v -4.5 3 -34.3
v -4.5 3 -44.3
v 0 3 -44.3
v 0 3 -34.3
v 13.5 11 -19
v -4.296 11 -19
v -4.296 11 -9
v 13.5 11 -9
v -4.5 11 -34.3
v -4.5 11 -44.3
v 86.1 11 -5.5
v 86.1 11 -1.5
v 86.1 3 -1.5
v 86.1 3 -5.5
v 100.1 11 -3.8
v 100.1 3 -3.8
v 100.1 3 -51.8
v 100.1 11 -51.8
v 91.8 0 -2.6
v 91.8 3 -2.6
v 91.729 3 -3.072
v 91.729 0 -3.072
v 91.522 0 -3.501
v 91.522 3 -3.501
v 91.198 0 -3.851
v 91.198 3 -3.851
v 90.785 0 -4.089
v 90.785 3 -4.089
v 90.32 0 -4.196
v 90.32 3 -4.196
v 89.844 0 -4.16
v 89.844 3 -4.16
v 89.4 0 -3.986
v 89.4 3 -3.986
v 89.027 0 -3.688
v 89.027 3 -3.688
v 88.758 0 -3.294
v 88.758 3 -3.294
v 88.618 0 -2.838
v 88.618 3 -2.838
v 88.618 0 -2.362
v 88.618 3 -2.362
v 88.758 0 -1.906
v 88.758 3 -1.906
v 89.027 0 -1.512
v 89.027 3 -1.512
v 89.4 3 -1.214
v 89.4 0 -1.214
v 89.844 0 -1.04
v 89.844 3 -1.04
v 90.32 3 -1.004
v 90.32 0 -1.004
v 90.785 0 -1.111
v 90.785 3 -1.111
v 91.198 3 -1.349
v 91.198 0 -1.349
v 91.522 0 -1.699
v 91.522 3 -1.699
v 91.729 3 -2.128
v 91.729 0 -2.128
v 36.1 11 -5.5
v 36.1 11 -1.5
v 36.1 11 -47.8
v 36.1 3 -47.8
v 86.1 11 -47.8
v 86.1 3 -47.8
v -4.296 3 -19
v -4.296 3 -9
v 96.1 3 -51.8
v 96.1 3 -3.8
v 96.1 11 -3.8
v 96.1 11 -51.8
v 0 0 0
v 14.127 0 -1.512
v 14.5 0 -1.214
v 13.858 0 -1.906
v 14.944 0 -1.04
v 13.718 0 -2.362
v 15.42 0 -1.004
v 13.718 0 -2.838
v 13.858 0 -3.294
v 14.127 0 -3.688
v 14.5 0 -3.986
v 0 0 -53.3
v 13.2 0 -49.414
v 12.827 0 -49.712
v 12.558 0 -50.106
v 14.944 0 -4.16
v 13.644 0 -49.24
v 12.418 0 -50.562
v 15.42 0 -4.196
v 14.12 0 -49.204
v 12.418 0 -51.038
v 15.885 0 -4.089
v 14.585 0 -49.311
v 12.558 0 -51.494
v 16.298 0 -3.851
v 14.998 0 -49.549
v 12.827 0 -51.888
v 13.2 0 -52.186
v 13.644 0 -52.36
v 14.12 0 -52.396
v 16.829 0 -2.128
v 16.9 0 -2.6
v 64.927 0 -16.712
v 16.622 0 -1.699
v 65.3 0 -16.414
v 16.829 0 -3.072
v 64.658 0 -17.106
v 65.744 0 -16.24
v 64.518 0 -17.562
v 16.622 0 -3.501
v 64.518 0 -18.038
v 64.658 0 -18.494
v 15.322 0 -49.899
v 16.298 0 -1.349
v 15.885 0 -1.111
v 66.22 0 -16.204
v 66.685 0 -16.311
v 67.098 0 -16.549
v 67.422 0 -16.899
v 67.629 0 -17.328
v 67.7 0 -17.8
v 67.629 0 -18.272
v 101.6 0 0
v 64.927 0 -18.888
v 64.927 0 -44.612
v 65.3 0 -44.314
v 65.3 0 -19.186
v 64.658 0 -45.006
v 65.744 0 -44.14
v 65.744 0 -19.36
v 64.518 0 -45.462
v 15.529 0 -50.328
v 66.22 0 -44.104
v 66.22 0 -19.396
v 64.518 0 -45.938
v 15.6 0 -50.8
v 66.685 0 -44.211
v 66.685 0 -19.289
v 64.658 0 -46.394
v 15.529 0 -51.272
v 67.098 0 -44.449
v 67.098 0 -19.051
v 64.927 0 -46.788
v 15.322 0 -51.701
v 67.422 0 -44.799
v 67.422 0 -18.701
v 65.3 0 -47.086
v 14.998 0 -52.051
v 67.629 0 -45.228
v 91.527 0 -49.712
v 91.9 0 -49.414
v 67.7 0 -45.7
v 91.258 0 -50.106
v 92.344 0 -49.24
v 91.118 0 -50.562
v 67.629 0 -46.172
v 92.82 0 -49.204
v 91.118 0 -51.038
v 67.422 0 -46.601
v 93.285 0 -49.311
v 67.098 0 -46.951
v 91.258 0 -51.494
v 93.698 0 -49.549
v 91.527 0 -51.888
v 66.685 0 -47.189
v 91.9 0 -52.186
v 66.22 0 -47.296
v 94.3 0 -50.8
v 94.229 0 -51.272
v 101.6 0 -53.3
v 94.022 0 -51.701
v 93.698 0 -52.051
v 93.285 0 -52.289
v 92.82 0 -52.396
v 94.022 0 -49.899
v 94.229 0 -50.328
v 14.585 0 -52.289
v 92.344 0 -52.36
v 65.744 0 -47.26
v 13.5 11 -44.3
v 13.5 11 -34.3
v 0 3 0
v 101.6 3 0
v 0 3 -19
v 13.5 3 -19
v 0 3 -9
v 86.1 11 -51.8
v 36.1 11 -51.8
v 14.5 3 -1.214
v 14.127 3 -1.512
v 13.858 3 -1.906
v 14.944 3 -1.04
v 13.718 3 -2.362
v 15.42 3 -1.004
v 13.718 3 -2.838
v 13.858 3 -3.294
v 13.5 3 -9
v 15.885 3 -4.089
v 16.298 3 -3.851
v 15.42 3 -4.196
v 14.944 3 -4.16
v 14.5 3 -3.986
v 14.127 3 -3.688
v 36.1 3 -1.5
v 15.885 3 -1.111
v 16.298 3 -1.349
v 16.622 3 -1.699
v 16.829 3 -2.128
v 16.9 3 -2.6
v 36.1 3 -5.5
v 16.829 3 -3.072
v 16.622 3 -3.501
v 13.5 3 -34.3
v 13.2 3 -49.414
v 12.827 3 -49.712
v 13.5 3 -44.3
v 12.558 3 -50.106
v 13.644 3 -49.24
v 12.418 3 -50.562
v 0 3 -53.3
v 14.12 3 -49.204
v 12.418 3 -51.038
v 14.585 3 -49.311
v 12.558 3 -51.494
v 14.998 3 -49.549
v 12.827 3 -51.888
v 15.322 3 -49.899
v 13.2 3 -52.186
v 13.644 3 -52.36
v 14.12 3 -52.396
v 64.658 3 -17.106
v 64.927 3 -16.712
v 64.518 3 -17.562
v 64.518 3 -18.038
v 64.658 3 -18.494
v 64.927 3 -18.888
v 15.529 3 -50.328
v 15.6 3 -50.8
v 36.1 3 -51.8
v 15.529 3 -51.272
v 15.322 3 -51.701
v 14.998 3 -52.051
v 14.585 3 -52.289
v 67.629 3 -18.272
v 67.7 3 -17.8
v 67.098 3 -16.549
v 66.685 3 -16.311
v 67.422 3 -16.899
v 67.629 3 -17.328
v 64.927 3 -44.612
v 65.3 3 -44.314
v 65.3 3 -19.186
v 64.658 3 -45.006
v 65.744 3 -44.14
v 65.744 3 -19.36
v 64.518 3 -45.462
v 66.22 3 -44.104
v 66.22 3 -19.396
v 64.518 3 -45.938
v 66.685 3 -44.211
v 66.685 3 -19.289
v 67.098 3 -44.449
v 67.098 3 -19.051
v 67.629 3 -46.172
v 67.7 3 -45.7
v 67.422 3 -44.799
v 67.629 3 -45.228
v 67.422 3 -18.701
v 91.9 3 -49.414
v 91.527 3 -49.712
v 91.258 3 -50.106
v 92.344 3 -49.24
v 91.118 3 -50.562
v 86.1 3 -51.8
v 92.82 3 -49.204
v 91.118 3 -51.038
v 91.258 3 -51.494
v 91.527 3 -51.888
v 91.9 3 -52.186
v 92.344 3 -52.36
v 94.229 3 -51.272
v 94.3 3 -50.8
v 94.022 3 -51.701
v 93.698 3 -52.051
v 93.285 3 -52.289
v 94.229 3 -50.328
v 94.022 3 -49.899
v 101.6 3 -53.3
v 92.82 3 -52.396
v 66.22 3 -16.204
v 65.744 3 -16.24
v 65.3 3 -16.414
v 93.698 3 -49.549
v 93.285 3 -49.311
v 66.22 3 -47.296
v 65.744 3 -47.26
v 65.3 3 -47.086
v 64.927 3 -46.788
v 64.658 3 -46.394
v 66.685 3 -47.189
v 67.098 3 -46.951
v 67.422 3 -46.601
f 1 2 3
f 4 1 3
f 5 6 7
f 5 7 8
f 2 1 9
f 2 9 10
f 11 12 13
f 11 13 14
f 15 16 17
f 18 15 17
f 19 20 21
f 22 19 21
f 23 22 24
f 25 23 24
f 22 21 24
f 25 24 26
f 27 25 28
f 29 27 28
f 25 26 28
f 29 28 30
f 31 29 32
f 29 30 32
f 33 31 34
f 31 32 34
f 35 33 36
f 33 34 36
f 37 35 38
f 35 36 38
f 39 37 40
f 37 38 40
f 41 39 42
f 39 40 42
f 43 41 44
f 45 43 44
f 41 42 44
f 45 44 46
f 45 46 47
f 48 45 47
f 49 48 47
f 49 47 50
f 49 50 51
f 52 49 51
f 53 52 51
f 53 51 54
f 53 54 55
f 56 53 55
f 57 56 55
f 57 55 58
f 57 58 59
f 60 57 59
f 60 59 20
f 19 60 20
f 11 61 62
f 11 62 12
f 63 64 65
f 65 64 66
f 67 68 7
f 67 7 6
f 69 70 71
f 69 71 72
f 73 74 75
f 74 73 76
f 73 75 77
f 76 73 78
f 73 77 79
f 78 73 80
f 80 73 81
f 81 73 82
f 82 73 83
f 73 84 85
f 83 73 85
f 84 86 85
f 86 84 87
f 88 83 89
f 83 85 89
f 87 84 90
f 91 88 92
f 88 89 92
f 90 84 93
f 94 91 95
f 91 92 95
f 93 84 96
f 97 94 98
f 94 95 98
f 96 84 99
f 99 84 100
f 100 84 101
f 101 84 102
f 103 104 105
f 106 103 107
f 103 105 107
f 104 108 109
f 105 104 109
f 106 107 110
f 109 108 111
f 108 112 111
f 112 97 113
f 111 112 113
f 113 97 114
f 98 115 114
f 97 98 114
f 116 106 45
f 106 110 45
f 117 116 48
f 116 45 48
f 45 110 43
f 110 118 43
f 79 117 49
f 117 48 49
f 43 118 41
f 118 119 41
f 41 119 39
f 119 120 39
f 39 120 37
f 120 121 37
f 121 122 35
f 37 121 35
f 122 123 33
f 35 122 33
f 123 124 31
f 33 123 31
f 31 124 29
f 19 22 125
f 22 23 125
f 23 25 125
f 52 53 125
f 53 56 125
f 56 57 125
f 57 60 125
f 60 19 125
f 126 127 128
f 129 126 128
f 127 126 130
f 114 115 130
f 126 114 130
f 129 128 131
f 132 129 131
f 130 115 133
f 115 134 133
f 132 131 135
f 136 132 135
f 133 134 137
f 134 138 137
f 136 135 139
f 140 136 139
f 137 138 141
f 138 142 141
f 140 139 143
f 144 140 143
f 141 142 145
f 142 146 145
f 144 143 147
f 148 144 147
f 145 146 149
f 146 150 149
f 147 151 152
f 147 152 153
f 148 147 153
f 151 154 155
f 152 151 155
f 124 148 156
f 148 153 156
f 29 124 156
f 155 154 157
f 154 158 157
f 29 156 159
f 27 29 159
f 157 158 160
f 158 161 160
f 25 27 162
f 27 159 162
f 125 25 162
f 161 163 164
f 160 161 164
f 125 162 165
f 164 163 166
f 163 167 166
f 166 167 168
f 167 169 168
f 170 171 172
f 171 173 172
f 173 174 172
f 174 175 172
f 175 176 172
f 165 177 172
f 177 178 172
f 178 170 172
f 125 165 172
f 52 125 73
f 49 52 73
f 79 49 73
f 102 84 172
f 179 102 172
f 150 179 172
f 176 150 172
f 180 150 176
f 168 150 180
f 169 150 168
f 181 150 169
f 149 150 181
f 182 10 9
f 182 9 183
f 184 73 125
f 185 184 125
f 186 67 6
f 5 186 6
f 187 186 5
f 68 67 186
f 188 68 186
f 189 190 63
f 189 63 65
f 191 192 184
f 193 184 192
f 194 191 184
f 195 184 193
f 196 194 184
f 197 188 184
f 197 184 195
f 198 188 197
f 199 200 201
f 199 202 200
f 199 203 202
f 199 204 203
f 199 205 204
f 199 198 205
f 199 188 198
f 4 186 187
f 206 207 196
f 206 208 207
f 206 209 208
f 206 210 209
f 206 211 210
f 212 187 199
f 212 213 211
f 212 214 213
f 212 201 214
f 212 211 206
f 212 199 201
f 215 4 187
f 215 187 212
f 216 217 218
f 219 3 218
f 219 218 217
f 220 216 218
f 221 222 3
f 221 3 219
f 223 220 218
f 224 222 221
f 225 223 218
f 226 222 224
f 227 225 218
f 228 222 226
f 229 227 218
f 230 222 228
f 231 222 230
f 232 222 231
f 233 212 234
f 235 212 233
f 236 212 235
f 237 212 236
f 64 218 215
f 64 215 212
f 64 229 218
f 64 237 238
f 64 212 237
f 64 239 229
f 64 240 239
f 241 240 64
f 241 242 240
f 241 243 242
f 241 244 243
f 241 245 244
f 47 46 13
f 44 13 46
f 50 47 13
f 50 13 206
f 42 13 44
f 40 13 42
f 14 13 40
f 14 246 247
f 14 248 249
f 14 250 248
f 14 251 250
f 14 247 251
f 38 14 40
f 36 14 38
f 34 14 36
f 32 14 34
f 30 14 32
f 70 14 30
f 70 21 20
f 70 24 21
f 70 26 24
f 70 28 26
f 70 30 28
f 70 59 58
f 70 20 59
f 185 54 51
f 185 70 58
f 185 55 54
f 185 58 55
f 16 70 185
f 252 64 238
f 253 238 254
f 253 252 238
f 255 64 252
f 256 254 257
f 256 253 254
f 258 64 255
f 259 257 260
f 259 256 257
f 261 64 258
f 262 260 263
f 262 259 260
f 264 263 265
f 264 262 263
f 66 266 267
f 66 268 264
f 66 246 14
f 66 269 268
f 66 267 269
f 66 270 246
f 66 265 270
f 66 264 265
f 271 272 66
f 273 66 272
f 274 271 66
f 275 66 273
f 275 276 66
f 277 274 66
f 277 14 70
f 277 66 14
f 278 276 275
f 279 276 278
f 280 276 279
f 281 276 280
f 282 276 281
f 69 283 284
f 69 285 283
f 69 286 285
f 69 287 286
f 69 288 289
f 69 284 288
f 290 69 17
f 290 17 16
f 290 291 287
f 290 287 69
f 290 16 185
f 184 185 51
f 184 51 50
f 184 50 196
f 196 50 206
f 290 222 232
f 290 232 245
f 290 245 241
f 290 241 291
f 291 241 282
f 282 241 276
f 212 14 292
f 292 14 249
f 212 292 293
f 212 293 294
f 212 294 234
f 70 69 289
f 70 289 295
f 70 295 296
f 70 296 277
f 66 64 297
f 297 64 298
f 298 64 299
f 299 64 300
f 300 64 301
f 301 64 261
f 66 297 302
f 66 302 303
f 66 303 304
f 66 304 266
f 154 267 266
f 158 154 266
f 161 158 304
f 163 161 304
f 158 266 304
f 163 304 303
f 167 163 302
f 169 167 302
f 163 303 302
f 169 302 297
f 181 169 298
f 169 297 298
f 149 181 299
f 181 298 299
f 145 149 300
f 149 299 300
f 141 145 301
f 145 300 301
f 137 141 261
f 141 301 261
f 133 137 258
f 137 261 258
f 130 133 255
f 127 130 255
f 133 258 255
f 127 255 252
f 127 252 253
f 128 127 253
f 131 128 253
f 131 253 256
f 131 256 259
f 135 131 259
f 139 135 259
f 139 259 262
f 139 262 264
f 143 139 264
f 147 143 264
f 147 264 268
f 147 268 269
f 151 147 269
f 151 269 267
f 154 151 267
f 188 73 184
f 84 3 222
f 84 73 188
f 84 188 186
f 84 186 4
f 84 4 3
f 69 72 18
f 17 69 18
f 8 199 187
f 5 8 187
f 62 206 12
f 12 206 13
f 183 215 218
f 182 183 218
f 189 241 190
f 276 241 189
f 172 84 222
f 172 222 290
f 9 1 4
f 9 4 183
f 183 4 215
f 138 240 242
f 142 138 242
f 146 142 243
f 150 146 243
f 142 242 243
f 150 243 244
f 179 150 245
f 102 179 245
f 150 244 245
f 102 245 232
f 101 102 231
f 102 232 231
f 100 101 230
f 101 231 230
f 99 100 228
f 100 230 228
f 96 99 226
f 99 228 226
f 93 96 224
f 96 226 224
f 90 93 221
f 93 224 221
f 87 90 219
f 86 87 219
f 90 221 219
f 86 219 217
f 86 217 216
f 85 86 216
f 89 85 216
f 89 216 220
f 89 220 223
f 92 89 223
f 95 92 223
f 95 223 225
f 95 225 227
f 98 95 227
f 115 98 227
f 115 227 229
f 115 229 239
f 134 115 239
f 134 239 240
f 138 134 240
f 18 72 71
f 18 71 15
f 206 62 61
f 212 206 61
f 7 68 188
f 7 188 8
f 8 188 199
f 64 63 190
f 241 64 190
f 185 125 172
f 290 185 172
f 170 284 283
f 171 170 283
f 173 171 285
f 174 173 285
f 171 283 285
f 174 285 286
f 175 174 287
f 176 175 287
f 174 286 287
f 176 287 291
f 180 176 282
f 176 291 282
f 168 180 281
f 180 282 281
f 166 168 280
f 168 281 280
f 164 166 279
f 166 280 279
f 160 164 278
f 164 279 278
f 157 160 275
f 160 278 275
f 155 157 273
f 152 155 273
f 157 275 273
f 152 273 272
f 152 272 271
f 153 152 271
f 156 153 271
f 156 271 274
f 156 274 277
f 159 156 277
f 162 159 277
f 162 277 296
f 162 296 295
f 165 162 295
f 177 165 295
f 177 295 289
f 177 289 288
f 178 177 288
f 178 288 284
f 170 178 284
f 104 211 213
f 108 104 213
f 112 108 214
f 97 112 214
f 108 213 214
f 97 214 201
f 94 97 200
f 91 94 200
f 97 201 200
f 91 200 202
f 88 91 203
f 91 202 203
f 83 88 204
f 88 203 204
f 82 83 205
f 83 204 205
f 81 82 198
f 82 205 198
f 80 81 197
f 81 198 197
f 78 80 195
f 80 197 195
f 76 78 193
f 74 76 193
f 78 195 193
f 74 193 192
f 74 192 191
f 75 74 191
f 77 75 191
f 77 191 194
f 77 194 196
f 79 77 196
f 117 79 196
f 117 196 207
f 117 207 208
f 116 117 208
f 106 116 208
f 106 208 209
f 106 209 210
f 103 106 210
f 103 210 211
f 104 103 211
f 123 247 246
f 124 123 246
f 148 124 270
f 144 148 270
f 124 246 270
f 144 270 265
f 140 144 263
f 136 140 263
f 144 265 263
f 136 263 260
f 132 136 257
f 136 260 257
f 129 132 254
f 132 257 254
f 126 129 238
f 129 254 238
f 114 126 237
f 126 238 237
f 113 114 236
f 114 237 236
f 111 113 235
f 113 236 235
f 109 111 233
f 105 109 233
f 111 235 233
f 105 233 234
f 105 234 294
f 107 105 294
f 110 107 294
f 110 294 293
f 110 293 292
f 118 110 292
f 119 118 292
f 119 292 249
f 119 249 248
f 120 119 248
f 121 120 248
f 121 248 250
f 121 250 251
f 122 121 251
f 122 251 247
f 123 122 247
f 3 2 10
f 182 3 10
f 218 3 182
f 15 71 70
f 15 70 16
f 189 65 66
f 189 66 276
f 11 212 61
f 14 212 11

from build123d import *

# Parameters (mm, degrees)
SKETCH1_W            = 101.6
SKETCH1_H            = 53.3
BOSS_EXTRUDE1_DEPTH  = 3
SKETCH2_W            = 50
SKETCH2_H            = 4
SKETCH2_W_2          = 4
SKETCH2_H_2          = 48
SKETCH2_W_3          = 18
SKETCH2_H_3          = 10
SKETCH2_W_4          = 17.796210121
BOSS_EXTRUDE2_DEPTH  = 8
M3_CLEARANCE_HOLE1_D = 3.2


with BuildPart() as part:
    # Sketch1 → Boss-Extrude1 (new body)
    with BuildSketch(Plane(origin=(0, 0, 0), x_dir=(1, 0, 0), z_dir=(0, 1, 0))):
        with Locations((50.8, 26.65)):
            Rectangle(SKETCH1_W, SKETCH1_H)
    extrude(amount=BOSS_EXTRUDE1_DEPTH)

    # Sketch2 → Boss-Extrude2 (add)
    with BuildSketch(Plane(origin=(0, 3, 0), x_dir=(1, 0, 0), z_dir=(0, 1, 0))):
        with Locations((61.1, 49.8)):
            Rectangle(SKETCH2_W, SKETCH2_H)
        with Locations((98.1, 27.8)):
            Rectangle(SKETCH2_W_2, SKETCH2_H_2)
        with Locations((61.1, 3.5)):
            Rectangle(SKETCH2_W, SKETCH2_H)
        with Locations((4.5, 39.3)):
            Rectangle(SKETCH2_W_3, SKETCH2_H_3)
        with Locations((4.601894939, 14)):
            Rectangle(SKETCH2_W_4, SKETCH2_H_3)
    extrude(amount=BOSS_EXTRUDE2_DEPTH)

    # M3 Clearance Hole1 (through all)
    with Locations(Plane(origin=(0, 0, 0), x_dir=(-1, 0, 0), z_dir=(0, -1, 0))):
        with Locations((-14, 50.8), (-66.1, 45.7), (-66.1, 17.8), (-92.7, 50.8), (-15.3, 2.6), (-90.2, 2.6)):
            Hole(M3_CLEARANCE_HOLE1_D / 2)


solid = part.part
